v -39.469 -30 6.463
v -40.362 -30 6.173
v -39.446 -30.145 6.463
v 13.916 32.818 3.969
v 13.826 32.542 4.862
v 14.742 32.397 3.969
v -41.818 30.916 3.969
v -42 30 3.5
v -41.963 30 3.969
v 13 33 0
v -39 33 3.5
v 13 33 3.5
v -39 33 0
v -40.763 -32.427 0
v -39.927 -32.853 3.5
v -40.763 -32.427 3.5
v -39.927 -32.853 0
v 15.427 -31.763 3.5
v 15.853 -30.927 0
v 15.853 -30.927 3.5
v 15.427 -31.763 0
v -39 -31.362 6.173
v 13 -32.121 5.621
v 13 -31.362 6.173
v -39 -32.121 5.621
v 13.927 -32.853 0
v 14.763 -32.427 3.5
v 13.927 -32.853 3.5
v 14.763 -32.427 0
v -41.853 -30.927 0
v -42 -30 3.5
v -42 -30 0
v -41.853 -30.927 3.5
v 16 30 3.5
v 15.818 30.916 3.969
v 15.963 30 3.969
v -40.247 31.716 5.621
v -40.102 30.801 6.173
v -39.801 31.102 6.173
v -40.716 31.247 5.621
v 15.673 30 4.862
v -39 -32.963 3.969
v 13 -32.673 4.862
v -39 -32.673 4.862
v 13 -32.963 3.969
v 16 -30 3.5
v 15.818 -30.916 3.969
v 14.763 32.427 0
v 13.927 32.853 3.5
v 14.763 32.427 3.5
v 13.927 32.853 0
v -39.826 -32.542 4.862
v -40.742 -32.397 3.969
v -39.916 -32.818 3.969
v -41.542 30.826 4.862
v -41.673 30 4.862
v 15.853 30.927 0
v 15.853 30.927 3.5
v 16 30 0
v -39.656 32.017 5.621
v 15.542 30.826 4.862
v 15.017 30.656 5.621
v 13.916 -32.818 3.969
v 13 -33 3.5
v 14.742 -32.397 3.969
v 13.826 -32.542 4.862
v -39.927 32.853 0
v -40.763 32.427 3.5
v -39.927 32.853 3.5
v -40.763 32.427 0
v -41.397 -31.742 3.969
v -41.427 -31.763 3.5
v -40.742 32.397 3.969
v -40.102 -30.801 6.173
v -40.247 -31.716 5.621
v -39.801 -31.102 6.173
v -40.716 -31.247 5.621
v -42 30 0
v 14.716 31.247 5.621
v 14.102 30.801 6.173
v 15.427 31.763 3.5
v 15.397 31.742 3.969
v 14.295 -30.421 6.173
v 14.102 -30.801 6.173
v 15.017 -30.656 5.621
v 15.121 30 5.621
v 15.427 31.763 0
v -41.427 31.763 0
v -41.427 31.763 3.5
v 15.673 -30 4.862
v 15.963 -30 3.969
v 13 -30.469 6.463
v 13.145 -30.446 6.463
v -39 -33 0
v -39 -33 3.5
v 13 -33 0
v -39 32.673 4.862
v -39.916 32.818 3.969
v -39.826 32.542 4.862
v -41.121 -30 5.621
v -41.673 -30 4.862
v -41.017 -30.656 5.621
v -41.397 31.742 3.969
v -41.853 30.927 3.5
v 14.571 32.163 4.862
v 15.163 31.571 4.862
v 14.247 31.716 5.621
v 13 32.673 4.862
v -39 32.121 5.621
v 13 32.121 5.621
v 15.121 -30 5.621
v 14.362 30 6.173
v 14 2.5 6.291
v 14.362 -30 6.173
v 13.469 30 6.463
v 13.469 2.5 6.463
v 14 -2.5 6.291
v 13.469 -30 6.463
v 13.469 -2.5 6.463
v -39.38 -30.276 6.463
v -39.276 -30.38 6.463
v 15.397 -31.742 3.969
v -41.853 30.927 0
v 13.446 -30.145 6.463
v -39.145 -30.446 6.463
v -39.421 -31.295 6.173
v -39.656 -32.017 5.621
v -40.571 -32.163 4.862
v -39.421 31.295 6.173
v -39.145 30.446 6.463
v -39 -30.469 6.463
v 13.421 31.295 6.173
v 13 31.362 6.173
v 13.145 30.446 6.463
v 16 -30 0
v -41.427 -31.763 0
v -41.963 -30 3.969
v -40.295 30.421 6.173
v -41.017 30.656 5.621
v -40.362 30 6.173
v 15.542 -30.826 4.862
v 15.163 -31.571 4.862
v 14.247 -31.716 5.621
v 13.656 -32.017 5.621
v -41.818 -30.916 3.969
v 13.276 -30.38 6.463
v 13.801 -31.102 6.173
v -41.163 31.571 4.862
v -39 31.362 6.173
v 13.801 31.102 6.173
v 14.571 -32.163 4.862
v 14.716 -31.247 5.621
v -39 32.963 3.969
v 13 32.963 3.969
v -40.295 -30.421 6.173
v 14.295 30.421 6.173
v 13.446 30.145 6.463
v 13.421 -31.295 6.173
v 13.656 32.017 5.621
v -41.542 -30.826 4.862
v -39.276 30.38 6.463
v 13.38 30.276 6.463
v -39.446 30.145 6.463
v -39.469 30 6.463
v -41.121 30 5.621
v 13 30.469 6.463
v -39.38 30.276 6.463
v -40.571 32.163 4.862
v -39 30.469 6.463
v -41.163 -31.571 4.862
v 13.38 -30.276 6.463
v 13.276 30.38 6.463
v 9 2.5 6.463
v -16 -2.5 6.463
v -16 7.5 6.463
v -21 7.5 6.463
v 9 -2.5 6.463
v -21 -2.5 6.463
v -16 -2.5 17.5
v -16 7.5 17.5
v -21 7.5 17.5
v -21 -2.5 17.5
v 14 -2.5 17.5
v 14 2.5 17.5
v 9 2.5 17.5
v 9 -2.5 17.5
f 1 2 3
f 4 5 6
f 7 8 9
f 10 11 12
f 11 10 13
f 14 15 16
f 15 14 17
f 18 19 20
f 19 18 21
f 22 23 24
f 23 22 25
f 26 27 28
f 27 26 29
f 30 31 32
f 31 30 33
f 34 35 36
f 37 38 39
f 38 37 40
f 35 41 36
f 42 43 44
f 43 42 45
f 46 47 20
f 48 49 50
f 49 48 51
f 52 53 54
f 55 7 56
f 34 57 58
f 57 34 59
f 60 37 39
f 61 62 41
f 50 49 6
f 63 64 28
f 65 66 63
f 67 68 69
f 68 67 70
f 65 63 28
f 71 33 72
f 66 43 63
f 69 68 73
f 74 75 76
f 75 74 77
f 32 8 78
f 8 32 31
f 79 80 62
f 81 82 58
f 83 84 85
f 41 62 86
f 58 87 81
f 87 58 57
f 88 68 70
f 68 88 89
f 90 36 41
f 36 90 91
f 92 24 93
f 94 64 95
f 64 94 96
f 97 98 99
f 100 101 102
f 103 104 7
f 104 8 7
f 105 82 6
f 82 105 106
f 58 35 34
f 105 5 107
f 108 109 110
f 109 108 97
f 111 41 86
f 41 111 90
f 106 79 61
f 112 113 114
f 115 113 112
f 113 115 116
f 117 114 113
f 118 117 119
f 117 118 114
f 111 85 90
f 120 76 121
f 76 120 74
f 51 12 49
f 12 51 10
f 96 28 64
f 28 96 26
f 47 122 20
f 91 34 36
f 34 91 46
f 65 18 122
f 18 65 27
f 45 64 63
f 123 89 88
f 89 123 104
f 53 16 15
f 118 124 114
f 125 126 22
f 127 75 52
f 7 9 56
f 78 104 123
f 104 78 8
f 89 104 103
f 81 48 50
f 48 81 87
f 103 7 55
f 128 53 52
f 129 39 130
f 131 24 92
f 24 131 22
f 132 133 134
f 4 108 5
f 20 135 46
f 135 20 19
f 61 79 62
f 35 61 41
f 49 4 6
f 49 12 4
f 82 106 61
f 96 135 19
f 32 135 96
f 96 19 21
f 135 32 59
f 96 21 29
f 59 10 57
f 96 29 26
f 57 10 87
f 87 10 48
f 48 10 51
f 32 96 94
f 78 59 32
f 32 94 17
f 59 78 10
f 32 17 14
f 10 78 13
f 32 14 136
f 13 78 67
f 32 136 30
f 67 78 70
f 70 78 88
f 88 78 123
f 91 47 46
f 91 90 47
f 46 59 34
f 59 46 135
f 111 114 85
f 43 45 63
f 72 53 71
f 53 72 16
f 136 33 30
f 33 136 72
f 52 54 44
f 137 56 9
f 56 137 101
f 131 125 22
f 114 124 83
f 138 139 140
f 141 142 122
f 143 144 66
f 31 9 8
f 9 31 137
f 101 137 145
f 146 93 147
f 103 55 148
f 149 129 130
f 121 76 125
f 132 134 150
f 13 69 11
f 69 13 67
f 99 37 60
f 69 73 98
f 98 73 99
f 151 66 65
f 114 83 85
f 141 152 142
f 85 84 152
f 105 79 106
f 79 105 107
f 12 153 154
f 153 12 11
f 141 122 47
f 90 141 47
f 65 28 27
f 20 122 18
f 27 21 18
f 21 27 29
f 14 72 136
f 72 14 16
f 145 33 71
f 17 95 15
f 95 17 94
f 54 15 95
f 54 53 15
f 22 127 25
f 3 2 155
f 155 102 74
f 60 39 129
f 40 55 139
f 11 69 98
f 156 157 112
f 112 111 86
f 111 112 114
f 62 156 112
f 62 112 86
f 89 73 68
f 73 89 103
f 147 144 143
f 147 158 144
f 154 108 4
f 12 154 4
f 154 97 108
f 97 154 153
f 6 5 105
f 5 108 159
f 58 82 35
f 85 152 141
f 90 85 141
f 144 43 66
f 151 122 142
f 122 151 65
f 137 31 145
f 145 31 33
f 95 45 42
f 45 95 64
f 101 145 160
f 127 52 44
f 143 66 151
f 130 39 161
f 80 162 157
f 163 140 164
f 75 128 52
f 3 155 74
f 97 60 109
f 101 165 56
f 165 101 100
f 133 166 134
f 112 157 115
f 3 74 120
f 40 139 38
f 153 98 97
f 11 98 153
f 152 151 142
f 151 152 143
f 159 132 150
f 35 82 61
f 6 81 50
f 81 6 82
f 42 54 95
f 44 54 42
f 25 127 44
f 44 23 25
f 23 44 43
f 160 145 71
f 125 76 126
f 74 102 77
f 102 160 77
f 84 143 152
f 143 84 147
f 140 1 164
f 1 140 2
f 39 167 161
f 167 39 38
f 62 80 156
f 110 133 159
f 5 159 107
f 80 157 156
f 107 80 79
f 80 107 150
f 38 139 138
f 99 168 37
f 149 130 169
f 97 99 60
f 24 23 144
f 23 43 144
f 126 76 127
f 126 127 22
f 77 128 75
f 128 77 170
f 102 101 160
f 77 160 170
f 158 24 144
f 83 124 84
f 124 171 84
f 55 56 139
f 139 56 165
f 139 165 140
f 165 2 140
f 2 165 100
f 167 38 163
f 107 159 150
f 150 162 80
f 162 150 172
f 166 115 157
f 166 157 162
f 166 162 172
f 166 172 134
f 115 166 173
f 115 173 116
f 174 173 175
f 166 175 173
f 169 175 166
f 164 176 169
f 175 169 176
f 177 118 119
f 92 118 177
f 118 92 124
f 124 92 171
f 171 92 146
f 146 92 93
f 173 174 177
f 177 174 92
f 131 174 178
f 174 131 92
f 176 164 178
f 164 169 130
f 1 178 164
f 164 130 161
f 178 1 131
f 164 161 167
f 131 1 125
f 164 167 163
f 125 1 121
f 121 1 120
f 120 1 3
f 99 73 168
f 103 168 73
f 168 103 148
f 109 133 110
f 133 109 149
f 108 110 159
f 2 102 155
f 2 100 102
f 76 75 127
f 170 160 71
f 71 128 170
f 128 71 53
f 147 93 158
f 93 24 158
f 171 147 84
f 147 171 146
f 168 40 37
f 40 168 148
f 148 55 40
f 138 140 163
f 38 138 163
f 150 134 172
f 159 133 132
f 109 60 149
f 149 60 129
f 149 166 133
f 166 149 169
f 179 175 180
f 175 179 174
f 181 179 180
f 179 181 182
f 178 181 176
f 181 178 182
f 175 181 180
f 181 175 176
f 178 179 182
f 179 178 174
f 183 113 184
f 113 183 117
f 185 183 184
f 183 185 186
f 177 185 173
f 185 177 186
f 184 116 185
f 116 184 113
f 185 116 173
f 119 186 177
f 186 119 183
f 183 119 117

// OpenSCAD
//Medidas de la base de la pieza original:
xBase = 52;
yBase = 60;
//La coordenada Z la separamos en el valor recto(altura cilindro) y el valor de la curva(radio esfera)
hCilindro = 3.5;
rEsfera = 3;
zBase = hCilindro + rEsfera;

//Medidas del saliente mayor de la base
xCubMay = 5;
yCubMay = 10;
zCubMay = 11;

//Medidas del saliente menor de la base
xCubMen = 5;
yCubMen = xCubMen;
zCubMen = zCubMay;

fn = 20;

hull(){

    translate([-3/4*xBase,-yBase/2,0])union () {
        translate([0,0,hCilindro])
        sphere(r=rEsfera, $fn=fn);
        cylinder (r=rEsfera, h=hCilindro, $fn=fn);
   }
   translate([xBase/4,yBase/2,0])union () {
        translate([0,0,hCilindro])
        sphere(r=rEsfera, $fn=fn);
        cylinder (r=rEsfera, h=hCilindro, $fn=fn);
   }
   translate([xBase/4,-yBase/2,0])union () {
        translate([0,0,hCilindro])
        sphere(r=rEsfera, $fn=fn);
        cylinder (r=rEsfera, h=hCilindro, $fn=fn);
   }
   translate([-3/4*xBase,yBase/2,0])union () {
        translate([0,0,hCilindro])
        sphere(r=rEsfera, $fn=fn);
        cylinder (r=rEsfera, h=hCilindro, $fn=fn);
   }
}
translate ([-21,-2.5,zBase-2])
cube([xCubMay,yCubMay,zCubMay+2]);

translate ([9,-2.5,zBase-2])
cube([xCubMen,yCubMen,zCubMen+2]);
